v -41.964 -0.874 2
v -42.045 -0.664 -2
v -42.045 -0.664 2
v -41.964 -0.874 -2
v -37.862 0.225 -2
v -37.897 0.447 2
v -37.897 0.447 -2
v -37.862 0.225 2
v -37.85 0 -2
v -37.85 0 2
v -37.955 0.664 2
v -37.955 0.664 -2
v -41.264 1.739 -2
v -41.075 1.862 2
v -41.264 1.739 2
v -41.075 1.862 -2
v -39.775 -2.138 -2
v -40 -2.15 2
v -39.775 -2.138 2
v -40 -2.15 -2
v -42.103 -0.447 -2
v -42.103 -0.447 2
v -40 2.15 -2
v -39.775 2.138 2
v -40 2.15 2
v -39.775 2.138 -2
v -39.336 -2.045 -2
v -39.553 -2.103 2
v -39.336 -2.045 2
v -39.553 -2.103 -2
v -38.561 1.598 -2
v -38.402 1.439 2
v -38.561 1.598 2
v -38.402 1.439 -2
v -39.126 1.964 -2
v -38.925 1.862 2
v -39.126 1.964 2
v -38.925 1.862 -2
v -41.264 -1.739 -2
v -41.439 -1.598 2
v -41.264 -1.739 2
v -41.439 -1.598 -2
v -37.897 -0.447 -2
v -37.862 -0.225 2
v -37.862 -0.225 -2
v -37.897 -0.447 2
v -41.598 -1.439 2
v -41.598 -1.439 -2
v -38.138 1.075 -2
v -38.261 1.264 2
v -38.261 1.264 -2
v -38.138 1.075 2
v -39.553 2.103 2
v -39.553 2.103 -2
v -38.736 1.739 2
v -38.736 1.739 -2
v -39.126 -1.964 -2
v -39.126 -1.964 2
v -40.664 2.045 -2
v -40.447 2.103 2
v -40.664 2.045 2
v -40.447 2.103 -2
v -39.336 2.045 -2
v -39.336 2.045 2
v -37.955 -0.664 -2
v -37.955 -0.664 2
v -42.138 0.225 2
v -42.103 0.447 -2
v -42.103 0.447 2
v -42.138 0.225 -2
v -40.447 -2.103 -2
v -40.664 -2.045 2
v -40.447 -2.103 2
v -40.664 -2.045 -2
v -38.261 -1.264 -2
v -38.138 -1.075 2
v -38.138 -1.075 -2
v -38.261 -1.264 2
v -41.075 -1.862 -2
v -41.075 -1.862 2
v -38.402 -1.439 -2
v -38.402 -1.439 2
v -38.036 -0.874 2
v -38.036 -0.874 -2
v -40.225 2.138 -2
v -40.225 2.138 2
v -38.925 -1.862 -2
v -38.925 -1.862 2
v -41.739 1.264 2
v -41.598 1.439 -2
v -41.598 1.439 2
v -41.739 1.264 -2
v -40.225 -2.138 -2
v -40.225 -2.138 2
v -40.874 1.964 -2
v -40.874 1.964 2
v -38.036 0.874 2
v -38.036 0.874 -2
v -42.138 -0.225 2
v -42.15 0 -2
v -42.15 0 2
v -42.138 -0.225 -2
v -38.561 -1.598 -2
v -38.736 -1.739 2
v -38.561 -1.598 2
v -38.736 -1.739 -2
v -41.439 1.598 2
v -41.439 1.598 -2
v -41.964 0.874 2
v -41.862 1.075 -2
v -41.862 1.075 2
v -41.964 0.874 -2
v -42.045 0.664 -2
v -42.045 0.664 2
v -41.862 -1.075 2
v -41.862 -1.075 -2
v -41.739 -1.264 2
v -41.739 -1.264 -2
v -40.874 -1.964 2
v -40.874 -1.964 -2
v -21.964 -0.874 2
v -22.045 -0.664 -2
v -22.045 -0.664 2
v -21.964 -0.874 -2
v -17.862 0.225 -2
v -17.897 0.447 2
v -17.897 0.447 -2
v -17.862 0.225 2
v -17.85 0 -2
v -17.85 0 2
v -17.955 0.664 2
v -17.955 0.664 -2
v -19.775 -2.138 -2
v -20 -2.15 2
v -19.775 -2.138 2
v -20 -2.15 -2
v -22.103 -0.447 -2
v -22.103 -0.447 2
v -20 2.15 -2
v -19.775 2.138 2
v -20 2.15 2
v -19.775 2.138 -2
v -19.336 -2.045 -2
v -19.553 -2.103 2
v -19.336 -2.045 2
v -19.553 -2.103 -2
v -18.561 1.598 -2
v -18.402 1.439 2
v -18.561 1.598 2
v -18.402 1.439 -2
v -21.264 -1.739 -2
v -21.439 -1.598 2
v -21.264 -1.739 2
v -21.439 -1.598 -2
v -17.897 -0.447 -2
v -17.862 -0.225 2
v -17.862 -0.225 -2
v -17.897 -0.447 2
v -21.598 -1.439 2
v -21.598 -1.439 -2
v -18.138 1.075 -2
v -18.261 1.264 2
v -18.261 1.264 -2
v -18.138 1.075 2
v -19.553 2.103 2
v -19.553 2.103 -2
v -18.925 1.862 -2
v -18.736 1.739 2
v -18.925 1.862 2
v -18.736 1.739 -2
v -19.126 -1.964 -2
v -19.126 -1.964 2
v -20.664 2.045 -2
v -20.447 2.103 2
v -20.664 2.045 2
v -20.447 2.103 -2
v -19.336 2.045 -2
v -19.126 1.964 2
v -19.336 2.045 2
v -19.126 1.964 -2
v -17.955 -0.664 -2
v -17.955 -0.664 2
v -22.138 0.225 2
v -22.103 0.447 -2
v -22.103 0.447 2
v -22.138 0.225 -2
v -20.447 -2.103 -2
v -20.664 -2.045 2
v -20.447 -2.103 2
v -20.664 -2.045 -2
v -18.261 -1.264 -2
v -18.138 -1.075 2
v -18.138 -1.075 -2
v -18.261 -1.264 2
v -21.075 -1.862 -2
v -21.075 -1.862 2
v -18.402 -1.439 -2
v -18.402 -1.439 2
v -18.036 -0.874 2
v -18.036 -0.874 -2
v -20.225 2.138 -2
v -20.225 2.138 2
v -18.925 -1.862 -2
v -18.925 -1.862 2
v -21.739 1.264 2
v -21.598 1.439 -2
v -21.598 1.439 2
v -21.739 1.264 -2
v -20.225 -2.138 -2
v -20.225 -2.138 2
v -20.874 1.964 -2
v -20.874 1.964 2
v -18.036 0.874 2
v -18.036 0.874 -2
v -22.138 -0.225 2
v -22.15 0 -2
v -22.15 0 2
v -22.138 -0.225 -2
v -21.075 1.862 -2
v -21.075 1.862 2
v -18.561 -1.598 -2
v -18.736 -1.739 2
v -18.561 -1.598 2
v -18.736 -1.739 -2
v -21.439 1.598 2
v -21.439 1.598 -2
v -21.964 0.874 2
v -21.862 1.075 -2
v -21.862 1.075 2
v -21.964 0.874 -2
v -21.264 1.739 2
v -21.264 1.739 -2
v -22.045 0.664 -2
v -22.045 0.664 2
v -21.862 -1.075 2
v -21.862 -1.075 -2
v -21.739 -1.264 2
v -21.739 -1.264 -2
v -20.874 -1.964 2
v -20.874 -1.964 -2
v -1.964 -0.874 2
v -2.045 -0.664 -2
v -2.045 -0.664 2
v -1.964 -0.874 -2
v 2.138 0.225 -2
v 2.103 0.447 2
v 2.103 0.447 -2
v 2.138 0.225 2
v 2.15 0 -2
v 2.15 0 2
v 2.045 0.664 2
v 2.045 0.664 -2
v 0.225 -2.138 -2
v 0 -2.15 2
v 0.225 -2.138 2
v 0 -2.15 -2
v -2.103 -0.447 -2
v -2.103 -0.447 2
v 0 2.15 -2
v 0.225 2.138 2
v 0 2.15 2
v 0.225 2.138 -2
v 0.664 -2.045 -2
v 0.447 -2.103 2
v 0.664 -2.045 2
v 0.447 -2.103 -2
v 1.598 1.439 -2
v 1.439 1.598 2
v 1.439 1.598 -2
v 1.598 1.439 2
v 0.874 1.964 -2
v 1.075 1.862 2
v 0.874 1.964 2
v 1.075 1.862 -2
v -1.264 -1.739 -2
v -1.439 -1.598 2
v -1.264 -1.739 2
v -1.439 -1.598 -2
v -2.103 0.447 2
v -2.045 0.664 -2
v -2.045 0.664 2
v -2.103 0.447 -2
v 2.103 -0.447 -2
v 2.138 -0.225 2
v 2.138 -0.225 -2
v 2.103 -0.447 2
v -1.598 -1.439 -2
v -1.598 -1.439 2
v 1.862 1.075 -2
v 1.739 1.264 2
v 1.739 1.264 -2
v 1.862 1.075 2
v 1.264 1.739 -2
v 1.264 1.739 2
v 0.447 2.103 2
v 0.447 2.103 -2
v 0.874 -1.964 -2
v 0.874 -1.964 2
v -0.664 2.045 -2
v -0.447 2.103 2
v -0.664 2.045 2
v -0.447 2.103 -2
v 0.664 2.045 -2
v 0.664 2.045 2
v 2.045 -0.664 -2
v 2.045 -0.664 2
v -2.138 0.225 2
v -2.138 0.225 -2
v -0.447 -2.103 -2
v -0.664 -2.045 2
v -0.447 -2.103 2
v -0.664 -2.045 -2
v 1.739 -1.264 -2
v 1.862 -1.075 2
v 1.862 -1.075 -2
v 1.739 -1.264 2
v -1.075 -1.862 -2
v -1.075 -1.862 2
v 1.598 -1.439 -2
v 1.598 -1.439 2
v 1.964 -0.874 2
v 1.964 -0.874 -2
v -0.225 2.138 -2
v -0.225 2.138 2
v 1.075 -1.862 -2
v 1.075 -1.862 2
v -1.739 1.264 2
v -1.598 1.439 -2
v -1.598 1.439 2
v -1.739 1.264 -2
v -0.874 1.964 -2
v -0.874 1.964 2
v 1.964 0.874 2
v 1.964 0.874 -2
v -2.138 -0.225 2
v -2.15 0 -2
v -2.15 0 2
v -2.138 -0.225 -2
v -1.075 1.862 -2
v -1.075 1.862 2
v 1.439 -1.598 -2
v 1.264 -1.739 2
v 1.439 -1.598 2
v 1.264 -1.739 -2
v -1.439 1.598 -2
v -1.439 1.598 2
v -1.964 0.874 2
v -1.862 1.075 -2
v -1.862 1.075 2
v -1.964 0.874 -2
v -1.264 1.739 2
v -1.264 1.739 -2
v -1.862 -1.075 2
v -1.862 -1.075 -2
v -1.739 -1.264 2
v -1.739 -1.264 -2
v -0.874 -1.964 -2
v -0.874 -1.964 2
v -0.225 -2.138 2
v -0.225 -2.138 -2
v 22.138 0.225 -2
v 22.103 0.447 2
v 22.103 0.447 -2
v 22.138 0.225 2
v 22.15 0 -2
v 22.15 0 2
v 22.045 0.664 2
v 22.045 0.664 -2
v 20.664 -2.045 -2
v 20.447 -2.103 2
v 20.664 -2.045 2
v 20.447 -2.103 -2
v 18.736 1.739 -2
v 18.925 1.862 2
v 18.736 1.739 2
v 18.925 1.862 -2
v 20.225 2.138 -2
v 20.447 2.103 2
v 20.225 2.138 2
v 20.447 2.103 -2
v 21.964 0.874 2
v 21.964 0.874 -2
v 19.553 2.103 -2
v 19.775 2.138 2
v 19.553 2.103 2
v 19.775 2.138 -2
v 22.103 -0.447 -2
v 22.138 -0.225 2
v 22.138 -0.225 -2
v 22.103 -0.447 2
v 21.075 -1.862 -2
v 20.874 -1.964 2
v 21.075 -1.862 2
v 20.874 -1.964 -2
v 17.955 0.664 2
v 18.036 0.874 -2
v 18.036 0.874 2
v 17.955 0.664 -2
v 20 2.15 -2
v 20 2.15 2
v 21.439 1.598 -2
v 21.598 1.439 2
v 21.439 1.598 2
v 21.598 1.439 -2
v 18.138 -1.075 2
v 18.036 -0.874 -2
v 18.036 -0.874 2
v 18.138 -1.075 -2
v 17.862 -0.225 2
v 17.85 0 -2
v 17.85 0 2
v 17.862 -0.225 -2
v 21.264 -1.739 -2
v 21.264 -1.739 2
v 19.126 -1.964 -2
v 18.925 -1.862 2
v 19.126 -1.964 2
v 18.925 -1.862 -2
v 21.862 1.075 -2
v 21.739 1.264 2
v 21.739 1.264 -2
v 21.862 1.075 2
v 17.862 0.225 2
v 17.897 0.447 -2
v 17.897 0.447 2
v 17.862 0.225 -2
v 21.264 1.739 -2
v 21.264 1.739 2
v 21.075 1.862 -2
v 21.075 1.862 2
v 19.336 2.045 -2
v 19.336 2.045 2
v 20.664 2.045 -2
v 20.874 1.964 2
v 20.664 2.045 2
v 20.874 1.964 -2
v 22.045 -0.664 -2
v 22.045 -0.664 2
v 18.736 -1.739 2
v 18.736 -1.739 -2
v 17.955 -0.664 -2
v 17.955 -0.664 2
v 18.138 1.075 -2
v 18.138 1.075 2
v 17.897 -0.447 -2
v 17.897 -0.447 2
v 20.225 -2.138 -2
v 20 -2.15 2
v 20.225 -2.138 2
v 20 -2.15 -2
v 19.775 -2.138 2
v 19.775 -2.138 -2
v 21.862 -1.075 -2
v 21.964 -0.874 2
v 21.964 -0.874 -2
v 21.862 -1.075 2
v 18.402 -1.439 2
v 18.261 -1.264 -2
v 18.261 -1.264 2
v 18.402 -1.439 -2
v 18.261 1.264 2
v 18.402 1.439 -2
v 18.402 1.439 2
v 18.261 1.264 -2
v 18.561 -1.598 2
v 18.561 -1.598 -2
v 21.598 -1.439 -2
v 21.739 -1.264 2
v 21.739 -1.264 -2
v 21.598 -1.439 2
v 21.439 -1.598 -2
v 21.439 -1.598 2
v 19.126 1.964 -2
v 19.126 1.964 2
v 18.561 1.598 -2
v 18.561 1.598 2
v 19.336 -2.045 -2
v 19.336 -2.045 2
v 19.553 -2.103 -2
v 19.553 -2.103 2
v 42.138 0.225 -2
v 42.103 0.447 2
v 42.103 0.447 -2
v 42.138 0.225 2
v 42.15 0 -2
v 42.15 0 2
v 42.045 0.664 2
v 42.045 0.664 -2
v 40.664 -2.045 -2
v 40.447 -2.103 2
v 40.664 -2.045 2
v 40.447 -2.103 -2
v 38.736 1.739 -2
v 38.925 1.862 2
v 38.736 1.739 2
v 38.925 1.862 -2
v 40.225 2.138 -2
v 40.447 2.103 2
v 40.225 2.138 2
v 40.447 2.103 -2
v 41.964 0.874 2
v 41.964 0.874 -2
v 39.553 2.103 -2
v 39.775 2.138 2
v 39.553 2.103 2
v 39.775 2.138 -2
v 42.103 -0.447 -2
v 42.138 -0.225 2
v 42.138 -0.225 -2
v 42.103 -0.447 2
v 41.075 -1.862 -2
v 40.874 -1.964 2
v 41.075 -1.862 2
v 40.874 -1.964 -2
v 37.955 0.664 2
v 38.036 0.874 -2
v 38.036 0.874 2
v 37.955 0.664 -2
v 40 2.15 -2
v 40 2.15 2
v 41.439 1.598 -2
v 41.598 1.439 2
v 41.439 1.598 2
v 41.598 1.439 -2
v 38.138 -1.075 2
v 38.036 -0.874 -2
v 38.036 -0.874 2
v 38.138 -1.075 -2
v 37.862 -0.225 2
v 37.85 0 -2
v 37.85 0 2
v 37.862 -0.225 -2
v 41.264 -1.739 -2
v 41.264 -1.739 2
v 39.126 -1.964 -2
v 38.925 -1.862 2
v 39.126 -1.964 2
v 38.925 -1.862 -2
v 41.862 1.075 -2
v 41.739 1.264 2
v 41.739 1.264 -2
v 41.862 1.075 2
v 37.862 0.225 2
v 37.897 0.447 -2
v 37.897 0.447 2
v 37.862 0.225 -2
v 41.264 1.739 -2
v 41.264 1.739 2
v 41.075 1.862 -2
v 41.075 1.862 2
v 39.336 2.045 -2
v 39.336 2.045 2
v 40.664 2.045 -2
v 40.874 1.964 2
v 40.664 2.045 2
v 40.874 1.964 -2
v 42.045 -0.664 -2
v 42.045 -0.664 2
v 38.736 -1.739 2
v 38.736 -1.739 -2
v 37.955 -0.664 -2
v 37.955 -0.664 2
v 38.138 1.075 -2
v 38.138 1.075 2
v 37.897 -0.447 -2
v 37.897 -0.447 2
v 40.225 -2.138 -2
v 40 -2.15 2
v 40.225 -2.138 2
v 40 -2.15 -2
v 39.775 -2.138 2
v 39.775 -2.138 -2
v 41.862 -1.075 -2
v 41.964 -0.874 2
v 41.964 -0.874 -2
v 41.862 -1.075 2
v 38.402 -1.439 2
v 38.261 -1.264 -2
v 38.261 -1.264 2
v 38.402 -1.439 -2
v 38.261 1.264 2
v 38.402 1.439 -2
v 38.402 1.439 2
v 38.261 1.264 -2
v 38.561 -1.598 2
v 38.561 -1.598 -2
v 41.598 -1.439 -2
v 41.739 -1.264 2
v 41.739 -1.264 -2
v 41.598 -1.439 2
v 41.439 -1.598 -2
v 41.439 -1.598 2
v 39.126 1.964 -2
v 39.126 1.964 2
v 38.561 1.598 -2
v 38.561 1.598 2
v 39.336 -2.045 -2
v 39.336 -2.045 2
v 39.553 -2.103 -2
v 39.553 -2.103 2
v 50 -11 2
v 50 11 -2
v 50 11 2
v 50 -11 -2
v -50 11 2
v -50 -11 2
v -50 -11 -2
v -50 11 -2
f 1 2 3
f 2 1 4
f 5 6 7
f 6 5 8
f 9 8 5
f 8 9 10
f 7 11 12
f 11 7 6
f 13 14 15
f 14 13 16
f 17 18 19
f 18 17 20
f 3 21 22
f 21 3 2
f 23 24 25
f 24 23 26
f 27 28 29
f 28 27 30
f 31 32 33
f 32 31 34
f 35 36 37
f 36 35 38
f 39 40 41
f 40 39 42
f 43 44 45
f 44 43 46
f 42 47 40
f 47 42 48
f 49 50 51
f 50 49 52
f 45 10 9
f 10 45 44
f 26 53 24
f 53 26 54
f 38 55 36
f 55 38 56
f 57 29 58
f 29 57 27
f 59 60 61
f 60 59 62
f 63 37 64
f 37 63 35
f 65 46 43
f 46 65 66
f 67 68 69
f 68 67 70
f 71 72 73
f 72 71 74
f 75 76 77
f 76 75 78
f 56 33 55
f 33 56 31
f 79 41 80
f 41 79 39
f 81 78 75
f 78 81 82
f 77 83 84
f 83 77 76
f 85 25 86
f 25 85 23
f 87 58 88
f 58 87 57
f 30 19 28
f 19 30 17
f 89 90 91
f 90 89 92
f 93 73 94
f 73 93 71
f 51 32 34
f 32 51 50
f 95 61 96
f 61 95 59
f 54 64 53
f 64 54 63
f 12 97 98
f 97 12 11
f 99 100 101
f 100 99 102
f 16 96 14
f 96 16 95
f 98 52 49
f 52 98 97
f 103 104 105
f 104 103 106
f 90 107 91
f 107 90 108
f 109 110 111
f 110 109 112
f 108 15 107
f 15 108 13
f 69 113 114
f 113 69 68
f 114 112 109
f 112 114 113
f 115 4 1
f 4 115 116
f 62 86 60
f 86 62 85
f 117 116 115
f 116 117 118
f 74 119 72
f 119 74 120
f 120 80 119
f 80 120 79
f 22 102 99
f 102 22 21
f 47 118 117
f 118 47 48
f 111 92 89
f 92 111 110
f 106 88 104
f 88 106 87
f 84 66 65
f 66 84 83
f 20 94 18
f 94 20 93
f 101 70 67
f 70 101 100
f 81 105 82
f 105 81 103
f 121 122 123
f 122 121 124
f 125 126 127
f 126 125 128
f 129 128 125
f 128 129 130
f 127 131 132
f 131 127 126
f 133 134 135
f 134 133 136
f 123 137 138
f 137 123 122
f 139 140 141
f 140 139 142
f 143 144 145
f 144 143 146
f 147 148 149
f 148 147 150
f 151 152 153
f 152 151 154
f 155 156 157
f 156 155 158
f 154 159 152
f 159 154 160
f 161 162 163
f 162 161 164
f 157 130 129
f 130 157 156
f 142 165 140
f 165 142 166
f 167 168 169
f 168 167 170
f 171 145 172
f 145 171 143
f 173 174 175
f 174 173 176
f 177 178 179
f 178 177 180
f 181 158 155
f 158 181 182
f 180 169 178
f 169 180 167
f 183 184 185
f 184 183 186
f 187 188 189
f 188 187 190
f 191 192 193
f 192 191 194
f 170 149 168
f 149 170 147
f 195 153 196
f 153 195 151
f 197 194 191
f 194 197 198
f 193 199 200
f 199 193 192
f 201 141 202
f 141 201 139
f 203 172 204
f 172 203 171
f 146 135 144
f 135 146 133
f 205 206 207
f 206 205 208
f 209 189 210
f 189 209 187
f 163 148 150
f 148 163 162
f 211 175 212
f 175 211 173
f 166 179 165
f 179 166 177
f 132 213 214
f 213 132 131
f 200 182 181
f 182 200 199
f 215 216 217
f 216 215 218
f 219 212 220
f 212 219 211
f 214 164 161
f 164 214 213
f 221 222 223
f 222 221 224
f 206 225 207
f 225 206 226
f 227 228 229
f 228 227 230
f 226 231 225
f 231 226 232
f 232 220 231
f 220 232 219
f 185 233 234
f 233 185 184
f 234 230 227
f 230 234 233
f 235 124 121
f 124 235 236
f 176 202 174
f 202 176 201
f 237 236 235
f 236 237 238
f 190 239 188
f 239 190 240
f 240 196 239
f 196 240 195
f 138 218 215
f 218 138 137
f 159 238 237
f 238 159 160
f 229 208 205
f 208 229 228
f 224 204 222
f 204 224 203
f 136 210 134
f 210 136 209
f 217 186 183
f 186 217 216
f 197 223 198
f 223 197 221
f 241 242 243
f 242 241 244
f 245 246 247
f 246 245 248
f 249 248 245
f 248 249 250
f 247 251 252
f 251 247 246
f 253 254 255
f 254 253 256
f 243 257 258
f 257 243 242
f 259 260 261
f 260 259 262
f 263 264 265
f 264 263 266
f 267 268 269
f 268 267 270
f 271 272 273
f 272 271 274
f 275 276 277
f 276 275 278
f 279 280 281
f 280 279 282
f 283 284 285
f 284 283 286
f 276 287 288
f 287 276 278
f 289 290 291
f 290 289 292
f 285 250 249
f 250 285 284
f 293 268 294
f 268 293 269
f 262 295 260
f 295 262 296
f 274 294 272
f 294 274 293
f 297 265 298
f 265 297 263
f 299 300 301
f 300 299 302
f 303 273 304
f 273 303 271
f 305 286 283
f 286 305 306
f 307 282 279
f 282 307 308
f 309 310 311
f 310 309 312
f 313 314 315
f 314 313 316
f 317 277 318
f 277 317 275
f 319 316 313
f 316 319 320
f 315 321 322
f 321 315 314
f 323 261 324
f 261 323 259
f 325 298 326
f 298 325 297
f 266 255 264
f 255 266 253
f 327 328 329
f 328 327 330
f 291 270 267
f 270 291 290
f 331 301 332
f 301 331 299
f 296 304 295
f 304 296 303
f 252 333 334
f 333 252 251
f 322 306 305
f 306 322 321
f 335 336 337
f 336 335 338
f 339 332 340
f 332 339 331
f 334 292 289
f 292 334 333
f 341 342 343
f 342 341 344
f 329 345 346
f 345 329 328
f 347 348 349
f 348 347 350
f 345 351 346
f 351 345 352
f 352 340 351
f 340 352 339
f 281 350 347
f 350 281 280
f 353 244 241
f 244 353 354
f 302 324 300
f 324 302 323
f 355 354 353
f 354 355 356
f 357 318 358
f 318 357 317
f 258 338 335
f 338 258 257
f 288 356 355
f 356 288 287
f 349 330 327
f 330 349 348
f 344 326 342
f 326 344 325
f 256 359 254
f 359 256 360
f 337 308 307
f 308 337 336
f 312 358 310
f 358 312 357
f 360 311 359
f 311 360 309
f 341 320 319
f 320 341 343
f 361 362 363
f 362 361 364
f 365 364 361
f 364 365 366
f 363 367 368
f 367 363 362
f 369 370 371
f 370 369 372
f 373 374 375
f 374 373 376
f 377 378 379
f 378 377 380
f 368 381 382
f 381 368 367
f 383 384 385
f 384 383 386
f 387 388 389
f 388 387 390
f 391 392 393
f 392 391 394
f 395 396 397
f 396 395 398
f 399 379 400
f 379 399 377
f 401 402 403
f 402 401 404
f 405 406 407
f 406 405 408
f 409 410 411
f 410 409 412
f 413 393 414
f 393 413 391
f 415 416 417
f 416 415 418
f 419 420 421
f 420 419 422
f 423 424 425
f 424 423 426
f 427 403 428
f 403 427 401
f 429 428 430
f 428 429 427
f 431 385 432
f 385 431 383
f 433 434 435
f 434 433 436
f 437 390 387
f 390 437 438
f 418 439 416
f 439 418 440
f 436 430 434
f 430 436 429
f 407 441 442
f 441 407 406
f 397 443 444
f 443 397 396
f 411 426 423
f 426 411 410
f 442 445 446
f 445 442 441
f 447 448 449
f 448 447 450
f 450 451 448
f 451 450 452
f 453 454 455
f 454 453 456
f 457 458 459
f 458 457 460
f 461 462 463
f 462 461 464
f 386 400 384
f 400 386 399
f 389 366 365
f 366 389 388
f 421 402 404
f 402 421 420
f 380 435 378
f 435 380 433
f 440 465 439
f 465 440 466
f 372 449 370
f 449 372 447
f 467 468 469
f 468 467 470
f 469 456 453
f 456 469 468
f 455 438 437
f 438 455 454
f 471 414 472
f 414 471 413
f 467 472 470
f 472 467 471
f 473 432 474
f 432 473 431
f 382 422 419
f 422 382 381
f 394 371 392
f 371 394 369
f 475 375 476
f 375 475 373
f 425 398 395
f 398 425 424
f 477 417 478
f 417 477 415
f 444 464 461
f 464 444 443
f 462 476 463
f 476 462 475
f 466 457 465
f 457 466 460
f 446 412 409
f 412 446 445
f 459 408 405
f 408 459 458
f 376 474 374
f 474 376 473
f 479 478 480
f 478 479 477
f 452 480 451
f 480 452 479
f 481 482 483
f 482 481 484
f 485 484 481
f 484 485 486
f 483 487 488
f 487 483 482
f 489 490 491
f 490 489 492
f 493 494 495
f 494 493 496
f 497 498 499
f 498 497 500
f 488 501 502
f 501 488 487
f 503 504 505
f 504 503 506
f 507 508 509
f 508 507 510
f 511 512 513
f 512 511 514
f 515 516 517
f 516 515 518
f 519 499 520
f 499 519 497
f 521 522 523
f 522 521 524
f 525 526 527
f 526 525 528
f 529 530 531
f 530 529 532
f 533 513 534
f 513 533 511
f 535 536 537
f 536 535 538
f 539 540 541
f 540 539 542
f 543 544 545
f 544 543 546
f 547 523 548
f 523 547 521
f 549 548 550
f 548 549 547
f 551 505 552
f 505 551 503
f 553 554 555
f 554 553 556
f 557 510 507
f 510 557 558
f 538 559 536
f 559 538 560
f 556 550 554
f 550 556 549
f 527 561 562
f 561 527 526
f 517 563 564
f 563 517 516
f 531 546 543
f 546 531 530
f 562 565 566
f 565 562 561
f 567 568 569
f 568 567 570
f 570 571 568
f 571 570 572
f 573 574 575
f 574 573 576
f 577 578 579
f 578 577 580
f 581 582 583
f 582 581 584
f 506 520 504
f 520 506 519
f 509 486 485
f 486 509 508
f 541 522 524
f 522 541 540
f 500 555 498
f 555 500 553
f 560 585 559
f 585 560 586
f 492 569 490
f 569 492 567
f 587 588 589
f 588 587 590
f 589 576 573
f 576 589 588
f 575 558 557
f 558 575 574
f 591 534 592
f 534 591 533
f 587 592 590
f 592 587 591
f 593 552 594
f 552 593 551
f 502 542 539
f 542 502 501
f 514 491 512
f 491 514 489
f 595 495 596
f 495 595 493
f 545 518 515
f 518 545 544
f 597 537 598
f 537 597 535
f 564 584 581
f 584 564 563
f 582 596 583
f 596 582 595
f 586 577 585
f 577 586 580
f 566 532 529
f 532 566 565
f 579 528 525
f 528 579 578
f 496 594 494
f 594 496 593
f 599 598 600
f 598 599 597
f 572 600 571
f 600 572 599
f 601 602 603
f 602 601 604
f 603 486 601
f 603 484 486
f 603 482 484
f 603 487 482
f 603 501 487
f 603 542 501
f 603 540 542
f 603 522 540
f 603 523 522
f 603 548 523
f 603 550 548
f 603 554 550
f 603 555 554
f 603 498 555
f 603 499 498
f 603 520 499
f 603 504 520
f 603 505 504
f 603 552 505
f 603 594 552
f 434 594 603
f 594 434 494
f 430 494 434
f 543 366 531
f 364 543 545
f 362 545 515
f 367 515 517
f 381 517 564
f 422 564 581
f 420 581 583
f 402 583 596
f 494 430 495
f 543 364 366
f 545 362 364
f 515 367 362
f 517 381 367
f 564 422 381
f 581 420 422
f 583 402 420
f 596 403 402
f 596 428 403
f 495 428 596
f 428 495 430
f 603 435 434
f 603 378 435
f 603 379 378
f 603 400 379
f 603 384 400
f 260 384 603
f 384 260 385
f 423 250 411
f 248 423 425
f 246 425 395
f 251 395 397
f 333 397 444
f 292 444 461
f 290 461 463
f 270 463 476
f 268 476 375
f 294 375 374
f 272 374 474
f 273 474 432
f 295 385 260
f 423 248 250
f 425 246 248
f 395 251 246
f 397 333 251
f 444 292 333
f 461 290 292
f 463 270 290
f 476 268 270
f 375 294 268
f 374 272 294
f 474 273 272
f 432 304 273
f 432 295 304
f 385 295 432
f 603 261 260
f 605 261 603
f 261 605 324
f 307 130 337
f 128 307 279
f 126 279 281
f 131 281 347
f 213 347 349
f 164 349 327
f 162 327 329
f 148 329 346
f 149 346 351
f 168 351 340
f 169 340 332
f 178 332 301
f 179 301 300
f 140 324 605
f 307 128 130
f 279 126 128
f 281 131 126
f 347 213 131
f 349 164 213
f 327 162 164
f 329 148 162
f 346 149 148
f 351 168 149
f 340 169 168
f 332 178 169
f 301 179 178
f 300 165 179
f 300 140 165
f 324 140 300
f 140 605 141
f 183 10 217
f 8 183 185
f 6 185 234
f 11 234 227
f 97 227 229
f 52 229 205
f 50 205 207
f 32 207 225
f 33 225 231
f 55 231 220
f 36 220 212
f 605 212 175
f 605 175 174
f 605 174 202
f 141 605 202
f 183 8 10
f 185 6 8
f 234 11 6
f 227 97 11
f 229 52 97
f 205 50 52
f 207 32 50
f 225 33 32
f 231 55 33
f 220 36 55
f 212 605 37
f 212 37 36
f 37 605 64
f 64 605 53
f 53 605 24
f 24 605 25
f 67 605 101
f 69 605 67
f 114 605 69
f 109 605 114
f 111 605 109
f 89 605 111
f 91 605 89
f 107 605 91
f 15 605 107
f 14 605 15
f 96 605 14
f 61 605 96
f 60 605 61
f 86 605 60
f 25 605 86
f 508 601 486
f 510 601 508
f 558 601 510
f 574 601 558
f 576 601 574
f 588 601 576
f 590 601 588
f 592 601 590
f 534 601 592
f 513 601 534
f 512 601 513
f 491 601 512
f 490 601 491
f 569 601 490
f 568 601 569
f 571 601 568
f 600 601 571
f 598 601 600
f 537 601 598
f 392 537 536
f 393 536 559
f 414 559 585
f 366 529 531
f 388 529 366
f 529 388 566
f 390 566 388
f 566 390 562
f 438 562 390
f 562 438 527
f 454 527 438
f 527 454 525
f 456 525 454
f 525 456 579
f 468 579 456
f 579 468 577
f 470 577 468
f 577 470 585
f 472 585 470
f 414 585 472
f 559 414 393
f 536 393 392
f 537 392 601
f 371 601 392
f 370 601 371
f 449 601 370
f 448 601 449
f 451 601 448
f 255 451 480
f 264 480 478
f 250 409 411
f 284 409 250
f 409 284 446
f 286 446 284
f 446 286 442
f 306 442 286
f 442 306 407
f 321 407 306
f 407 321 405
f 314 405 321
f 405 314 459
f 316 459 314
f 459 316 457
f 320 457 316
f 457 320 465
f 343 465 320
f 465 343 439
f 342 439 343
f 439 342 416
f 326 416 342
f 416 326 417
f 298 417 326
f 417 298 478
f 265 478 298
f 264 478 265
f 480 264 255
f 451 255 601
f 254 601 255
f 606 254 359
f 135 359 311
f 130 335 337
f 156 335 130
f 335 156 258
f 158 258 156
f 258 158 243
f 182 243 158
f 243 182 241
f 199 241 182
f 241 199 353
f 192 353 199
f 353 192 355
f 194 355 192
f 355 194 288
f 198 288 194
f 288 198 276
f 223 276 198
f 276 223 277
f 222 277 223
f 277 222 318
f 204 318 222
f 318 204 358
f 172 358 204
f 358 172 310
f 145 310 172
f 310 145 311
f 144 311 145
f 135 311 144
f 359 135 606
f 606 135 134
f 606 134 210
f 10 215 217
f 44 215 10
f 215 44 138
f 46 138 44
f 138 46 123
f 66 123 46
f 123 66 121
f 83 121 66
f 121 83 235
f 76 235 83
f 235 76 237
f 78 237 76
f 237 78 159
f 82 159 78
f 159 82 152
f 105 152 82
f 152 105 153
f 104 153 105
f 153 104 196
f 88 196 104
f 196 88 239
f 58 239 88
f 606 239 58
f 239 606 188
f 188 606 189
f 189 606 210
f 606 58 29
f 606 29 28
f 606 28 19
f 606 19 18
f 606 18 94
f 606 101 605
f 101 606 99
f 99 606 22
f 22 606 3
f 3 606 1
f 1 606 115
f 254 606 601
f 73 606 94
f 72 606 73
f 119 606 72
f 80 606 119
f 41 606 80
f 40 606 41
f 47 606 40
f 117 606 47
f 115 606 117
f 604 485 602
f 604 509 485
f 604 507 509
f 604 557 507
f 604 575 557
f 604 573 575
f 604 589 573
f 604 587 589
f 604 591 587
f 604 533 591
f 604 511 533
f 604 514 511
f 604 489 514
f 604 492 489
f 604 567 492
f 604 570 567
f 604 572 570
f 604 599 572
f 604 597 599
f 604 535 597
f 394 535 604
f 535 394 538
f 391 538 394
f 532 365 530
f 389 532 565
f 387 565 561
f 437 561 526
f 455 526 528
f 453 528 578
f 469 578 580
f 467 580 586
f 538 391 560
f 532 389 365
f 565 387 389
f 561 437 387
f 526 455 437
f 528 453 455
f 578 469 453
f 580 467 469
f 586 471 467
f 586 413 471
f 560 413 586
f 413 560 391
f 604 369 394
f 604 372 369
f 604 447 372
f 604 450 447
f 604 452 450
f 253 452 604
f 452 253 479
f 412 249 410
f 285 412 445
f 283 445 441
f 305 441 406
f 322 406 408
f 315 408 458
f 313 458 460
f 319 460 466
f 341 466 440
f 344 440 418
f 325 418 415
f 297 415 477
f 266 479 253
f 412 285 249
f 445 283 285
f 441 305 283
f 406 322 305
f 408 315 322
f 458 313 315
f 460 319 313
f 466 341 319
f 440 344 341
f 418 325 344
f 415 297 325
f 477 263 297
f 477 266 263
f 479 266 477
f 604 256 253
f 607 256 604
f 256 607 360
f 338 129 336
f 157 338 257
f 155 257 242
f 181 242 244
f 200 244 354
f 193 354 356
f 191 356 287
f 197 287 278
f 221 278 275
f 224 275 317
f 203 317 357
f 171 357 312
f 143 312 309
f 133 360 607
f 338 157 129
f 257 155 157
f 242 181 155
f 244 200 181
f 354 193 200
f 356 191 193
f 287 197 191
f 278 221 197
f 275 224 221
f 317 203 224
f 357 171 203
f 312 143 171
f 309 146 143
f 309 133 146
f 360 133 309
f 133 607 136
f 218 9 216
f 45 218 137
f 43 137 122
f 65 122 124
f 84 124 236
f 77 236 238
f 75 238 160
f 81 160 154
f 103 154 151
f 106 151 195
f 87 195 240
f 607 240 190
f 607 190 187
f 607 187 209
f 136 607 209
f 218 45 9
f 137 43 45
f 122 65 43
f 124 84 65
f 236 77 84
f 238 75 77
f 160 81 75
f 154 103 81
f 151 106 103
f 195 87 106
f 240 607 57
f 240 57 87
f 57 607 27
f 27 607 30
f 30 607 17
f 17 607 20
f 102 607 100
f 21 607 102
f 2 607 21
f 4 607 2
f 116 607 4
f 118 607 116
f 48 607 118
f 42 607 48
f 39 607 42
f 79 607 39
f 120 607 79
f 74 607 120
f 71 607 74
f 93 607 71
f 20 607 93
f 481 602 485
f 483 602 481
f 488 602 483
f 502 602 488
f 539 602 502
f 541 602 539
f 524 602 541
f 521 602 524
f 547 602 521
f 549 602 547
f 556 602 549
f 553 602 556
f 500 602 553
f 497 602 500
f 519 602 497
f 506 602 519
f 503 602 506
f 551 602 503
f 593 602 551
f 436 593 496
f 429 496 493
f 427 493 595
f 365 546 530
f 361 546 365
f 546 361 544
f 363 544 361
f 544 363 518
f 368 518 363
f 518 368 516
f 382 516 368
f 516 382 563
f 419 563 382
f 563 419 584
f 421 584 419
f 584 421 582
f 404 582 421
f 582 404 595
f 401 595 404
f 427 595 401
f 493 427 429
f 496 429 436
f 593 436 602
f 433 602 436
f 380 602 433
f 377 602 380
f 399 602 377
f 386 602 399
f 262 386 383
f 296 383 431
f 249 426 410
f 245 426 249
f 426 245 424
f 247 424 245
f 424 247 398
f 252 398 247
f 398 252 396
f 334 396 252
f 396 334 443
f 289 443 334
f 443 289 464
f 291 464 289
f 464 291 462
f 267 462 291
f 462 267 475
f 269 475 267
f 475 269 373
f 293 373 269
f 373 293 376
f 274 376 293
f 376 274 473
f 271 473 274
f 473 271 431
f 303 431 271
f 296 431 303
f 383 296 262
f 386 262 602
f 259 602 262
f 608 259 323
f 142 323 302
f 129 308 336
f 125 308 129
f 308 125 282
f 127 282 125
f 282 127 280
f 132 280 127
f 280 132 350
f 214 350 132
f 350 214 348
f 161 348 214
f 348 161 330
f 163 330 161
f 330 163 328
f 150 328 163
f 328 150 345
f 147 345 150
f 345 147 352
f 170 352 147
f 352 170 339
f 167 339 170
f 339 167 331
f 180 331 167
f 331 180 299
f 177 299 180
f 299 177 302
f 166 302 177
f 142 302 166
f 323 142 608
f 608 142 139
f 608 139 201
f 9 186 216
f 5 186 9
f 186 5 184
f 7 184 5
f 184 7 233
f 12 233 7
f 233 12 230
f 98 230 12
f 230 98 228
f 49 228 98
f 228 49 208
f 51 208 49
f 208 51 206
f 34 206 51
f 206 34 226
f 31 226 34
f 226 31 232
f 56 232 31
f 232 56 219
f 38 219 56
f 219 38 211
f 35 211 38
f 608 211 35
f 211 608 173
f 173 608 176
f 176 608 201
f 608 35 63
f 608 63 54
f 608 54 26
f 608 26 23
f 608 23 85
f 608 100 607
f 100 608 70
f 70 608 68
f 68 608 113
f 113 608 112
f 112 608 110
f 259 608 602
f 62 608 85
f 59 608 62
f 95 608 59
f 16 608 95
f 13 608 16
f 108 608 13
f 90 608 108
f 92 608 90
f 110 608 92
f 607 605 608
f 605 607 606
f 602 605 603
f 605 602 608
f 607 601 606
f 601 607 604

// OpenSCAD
// Linear rail spacer strip.
$fn = 60;
eps = 0.02;
length = 100;
width = 22;
thickness = 4;
hole_pitch = 20;
difference() {
    cube([length,width,thickness],center=true);
    for (x=[-length/2+10:hole_pitch:length/2-10]) translate([x,0,-thickness/2-eps]) cylinder(d=4.3,h=thickness+2*eps);
}
